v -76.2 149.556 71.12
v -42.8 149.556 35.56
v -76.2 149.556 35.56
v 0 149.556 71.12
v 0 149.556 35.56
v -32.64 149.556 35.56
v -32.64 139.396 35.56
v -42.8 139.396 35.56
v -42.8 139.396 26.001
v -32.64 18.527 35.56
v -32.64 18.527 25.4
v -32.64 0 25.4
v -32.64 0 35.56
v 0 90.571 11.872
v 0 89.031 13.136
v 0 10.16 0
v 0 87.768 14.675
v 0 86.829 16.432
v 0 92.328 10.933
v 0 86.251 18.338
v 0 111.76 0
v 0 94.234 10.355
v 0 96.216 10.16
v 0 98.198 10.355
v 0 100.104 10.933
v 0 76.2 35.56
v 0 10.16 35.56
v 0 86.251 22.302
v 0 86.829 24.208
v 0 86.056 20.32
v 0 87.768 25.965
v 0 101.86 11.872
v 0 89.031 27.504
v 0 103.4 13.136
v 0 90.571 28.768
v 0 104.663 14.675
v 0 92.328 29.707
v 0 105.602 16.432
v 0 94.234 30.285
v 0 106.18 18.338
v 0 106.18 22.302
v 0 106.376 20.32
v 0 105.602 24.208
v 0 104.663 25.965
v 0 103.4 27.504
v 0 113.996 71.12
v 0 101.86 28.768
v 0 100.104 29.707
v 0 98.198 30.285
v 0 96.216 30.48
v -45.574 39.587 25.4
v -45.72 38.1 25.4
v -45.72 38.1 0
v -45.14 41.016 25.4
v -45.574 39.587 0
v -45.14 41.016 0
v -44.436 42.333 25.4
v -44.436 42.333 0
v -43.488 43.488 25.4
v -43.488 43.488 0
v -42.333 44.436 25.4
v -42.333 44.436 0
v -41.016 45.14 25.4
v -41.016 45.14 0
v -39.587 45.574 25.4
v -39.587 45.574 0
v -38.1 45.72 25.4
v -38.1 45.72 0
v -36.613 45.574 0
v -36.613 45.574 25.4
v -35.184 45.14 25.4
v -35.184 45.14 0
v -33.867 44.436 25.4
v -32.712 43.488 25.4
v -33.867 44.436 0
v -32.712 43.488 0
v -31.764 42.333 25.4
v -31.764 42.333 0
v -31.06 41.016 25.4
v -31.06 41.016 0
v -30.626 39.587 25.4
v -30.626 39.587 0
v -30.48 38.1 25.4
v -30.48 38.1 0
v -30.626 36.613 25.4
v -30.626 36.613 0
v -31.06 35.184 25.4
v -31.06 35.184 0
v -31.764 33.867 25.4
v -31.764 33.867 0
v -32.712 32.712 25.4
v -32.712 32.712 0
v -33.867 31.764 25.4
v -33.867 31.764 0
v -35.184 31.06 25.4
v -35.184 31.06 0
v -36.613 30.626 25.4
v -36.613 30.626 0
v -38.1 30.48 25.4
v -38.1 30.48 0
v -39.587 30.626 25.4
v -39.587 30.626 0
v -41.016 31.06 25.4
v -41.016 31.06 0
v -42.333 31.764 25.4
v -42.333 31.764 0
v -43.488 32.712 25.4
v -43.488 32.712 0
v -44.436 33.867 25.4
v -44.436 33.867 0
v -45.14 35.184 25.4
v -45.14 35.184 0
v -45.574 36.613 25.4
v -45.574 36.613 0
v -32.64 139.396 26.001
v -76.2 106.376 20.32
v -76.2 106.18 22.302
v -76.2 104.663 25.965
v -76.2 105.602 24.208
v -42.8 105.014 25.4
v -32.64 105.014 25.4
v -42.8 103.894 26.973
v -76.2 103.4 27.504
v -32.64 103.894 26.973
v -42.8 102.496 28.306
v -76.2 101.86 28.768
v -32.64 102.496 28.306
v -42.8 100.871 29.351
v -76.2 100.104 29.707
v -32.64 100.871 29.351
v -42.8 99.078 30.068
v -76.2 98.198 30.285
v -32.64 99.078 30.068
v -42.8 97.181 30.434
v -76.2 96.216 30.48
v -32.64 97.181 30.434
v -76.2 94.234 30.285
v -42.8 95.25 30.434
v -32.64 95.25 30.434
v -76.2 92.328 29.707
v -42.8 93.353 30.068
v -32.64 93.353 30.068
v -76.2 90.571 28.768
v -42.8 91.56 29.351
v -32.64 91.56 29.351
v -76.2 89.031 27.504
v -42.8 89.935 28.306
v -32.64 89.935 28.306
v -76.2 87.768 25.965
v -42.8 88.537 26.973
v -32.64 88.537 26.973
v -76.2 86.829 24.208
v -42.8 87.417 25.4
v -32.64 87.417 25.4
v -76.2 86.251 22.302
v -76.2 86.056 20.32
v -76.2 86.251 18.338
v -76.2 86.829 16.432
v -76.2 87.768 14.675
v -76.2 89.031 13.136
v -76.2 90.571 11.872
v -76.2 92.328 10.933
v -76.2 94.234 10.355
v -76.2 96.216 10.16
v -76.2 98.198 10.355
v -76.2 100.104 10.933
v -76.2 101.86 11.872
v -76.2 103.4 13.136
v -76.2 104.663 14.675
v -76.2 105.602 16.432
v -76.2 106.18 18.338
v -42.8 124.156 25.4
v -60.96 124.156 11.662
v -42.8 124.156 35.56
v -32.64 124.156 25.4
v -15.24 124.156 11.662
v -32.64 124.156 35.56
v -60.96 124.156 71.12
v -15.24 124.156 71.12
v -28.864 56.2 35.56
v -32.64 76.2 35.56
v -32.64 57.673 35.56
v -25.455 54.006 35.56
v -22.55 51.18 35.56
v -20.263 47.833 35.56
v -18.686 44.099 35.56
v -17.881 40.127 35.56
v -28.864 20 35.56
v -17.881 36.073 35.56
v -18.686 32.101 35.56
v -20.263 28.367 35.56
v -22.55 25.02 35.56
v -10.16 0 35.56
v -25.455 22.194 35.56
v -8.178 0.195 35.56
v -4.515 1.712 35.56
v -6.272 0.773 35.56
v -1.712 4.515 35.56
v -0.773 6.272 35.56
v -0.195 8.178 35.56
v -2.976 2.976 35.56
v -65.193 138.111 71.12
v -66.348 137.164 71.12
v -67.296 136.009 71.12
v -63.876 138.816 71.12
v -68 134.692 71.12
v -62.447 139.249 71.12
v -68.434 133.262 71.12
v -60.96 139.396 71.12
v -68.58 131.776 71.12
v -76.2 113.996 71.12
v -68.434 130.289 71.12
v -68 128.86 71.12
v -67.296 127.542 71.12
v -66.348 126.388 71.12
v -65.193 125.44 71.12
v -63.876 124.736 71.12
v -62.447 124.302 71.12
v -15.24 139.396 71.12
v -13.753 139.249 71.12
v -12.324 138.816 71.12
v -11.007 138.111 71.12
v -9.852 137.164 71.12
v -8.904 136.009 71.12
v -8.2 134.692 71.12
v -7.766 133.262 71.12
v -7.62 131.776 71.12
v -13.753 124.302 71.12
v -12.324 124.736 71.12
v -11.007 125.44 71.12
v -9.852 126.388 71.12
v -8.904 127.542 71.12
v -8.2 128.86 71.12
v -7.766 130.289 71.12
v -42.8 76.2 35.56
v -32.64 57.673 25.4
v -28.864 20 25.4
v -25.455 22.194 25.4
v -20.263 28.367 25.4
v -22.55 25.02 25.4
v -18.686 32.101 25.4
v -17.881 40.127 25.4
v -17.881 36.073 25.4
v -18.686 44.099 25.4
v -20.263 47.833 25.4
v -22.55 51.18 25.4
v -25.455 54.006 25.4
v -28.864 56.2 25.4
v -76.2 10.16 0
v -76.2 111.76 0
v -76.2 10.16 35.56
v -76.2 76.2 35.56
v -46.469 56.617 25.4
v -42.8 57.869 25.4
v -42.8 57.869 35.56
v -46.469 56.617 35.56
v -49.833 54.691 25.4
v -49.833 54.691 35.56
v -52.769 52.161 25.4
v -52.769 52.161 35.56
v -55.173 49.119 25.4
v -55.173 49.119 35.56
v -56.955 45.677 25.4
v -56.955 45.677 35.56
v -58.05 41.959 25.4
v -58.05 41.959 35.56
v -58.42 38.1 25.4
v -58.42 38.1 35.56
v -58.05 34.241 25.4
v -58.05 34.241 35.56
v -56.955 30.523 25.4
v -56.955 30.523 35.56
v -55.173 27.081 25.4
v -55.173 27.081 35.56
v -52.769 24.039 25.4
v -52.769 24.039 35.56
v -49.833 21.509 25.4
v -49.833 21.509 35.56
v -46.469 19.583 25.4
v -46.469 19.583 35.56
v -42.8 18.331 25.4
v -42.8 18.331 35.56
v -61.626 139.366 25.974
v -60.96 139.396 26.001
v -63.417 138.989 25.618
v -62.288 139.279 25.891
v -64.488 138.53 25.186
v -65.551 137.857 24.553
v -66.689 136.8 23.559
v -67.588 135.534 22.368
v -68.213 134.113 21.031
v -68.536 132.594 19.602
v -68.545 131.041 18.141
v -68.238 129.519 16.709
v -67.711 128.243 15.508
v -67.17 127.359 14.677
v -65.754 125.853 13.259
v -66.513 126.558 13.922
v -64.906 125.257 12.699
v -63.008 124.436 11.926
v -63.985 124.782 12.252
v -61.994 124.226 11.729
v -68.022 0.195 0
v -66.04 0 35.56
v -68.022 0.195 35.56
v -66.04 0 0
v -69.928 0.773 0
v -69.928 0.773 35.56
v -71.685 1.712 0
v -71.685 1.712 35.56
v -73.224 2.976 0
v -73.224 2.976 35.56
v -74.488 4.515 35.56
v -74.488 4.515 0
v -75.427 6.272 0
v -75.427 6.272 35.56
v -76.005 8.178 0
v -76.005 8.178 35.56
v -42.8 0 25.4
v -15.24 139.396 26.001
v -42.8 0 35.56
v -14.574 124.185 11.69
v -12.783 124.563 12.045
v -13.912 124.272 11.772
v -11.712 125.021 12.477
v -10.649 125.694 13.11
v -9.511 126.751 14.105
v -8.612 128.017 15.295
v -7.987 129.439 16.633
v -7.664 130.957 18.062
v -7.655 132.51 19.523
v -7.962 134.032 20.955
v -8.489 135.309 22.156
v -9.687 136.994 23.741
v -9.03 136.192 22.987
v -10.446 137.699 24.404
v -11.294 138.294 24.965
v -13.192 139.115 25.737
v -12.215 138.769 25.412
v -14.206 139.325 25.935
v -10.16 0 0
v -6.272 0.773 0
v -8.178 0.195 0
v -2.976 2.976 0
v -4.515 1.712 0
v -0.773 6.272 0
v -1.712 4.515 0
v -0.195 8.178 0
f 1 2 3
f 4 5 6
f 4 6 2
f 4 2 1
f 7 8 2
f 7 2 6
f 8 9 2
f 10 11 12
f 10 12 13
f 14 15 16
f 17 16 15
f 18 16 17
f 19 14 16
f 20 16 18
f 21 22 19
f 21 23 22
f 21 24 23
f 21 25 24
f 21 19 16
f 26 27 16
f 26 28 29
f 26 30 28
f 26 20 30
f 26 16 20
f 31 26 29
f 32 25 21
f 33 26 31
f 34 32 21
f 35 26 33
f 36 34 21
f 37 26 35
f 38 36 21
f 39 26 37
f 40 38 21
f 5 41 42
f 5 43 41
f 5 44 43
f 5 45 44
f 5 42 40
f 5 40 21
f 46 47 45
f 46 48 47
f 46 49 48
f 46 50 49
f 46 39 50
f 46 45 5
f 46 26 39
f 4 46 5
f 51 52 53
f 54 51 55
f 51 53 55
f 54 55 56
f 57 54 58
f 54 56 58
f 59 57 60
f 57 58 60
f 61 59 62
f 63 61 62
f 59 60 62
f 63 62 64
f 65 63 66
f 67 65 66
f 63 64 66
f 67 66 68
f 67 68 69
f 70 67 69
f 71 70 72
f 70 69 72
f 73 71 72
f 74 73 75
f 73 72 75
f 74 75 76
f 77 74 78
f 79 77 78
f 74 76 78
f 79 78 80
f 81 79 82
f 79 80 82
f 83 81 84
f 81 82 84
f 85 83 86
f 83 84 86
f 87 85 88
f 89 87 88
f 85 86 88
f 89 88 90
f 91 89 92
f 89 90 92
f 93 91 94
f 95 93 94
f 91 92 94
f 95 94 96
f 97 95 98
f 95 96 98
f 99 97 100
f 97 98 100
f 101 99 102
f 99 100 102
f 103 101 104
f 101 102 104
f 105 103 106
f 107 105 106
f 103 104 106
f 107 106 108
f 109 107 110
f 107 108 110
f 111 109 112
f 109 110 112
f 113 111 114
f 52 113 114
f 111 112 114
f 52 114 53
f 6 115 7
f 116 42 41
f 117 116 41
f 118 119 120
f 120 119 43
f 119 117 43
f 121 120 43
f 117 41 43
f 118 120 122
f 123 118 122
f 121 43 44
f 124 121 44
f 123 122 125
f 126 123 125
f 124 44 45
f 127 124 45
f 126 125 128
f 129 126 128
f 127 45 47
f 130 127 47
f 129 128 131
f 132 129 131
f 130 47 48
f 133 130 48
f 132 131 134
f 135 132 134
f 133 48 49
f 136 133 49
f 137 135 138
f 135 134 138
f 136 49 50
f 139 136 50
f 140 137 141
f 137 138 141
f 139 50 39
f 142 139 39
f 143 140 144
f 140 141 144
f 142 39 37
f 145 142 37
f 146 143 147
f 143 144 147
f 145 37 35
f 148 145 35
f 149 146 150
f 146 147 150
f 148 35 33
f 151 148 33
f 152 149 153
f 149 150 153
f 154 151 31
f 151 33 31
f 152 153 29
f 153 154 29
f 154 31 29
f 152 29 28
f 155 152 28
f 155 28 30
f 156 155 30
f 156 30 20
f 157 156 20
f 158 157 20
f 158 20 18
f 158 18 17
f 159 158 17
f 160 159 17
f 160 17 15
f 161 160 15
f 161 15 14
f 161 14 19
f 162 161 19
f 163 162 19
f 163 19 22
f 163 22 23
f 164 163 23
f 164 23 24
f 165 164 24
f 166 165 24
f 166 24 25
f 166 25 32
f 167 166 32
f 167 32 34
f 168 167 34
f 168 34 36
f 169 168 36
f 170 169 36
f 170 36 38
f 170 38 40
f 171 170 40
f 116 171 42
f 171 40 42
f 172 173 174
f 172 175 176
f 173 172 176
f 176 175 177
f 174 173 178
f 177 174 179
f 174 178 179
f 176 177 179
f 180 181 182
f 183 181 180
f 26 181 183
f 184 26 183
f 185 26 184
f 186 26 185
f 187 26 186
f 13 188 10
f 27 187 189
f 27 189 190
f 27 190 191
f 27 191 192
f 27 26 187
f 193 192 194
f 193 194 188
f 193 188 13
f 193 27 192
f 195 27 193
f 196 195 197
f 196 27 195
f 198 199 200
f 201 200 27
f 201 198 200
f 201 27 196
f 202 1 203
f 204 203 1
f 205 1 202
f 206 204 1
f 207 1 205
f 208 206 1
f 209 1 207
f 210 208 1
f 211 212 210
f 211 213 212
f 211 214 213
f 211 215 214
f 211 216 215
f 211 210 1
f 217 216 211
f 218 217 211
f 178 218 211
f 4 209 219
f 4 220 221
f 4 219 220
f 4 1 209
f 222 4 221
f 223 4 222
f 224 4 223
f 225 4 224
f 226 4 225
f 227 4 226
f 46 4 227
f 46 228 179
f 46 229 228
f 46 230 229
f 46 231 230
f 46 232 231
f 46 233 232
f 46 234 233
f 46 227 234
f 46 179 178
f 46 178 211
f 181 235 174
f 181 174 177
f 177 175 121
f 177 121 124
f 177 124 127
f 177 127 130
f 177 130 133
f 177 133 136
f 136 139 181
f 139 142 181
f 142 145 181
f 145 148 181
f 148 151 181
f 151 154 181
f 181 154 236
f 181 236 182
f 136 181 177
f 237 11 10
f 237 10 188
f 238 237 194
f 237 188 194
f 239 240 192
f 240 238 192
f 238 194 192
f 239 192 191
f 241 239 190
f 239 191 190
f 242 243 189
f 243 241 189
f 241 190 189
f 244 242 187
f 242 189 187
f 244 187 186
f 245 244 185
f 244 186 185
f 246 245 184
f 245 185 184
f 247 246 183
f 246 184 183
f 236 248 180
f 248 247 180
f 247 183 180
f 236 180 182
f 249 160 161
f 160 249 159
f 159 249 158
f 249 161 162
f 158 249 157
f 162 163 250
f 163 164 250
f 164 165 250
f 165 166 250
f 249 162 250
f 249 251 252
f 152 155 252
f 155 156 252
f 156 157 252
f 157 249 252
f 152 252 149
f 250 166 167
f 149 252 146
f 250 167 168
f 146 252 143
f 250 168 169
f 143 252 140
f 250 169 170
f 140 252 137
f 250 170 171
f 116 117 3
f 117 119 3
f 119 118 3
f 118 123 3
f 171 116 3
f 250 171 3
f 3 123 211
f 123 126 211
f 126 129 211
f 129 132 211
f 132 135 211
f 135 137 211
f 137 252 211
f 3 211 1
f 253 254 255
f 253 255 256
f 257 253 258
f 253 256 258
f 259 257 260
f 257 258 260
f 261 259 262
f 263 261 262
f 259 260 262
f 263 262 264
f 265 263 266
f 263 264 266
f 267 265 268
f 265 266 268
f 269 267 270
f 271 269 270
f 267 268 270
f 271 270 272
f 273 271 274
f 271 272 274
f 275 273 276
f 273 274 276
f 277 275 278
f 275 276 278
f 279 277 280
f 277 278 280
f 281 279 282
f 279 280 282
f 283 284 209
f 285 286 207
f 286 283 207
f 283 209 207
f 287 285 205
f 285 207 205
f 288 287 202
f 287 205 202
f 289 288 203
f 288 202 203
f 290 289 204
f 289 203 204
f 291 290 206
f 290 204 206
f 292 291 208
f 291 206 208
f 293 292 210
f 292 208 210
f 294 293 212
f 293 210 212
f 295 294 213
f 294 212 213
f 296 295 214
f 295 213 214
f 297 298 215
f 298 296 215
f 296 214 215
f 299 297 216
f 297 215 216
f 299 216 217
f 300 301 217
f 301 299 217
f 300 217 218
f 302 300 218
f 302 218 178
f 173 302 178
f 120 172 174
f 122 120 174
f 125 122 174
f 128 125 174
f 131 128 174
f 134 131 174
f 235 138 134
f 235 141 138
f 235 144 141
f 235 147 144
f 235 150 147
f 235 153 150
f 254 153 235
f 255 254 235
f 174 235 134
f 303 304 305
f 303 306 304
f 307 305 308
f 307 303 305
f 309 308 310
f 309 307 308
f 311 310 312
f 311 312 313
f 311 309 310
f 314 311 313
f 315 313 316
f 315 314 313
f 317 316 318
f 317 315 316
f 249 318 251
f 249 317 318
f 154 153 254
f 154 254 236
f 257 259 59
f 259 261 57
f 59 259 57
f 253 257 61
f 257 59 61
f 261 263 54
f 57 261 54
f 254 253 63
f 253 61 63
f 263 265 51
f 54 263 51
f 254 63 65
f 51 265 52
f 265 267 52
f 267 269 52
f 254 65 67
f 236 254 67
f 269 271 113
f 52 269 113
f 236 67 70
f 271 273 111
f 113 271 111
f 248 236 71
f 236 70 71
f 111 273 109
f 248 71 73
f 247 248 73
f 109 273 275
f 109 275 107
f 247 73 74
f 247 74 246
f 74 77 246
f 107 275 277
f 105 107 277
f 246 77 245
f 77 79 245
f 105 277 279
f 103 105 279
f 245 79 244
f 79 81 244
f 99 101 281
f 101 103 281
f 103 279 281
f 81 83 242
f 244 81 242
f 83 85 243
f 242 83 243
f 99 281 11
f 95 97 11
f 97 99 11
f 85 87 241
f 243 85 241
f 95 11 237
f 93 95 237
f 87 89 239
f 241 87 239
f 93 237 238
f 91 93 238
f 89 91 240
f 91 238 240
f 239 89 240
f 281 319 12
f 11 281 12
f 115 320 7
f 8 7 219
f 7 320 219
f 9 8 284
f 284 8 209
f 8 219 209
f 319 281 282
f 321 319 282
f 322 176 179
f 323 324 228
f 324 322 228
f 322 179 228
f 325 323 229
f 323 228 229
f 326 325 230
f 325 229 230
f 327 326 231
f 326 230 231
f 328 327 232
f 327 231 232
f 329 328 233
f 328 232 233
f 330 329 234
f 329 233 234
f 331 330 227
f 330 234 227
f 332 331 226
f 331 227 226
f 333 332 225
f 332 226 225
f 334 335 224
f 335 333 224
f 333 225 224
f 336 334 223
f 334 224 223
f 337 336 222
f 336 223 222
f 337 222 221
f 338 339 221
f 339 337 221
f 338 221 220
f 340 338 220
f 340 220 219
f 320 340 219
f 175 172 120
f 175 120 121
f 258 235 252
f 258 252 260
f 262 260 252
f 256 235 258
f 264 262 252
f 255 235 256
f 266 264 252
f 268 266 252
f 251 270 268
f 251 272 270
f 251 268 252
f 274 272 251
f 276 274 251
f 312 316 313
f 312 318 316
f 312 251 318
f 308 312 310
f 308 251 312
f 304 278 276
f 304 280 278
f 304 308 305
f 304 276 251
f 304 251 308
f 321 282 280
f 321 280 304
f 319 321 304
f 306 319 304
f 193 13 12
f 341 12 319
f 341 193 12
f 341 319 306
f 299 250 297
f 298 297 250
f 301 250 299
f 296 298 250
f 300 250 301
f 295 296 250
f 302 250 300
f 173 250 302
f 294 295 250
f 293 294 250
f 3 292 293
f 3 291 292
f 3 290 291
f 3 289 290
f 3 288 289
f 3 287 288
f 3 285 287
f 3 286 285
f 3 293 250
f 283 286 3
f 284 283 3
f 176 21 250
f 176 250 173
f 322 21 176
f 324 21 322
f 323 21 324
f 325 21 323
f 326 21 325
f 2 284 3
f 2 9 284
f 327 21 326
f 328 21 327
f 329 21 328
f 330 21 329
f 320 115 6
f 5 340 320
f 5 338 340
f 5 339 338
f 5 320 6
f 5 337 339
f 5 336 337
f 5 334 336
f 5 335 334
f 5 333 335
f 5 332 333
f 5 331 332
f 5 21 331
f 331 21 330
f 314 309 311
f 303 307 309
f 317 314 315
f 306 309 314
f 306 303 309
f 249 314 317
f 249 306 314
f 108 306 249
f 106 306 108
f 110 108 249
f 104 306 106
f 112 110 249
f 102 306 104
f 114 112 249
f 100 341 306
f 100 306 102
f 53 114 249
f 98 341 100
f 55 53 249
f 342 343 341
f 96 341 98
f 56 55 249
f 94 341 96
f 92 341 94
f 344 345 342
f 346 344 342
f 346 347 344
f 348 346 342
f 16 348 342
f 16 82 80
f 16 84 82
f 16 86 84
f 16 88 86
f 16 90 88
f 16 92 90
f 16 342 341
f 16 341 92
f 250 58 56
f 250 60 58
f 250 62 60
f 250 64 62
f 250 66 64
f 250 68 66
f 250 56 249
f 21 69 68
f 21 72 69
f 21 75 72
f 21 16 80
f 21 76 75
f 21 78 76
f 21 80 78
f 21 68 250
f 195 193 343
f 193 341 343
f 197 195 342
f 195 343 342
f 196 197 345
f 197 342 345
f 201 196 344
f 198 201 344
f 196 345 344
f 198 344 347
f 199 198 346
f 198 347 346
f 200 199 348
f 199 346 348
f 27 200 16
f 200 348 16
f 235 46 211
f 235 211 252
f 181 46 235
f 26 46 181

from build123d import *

# Parameters (mm, degrees)
F1_DEPTH       = 76.2
F2_R           = 10.16
F4_D           = 15.24
F4_CBORE_D     = 40.64
F4_CBORE_DEPTH = 10.16
F5_R           = 10.16
F6_DEPTH       = 76.201
F8_W           = 10.16
F8_H           = 10.16
F9_DEPTH       = 149.556668
F10_DEPTH      = 71.121


with BuildPart() as f1:
    # F0 (on Right) → F1 (new body)
    with BuildSketch(Plane.YZ):
        Polygon((76.2, 35.56), (0, 35.56), (0, 0), (111.76, 0), (149.555668, 35.56), (149.555668, 71.12), (113.995668, 71.12), align=None)
    extrude(amount=-F1_DEPTH)

    # F2
    f2_edges = [f1.edges().sort_by_distance(p)[0] for p in [
        (-76.2, 0, 17.78),
        (0, 0, 17.78),
    ]]
    fillet(f2_edges, radius=F2_R)

    # F4 (through all)
    with Locations(Plane.XY.offset(35.56)):
        with Locations((-38.1, 38.1)):
            CounterBoreHole(F4_D / 2, F4_CBORE_D / 2, F4_CBORE_DEPTH)

    # F5 (on face) → F6 (cut, through all)
    with BuildSketch(Plane.YZ):
        with Locations((96.215668, 20.32)):
            Circle(F5_R)
    extrude(amount=-F6_DEPTH, mode=Mode.SUBTRACT)

    # F8 (on face) → F9 (cut, through all)
    with BuildSketch(Plane.XZ):
        with Locations((-37.720058, 30.48)):
            Rectangle(F8_W, F8_H)
    extrude(amount=-F9_DEPTH, mode=Mode.SUBTRACT)

    # F7 (on face) → F10 (cut, through all)
    with BuildSketch(Plane.XY.offset(71.12)):
        with BuildLine():
            Line((-15.24, 139.395668), (-60.96, 139.395668))
            ThreePointArc((-60.96, 139.395668), (-68.58, 131.775668), (-60.96, 124.155668))
            Line((-60.96, 124.155668), (-15.24, 124.155668))
            ThreePointArc((-15.24, 124.155668), (-7.62, 131.775668), (-15.24, 139.395668))
        make_face()
    extrude(amount=-F10_DEPTH, mode=Mode.SUBTRACT)


solid = f1.part
